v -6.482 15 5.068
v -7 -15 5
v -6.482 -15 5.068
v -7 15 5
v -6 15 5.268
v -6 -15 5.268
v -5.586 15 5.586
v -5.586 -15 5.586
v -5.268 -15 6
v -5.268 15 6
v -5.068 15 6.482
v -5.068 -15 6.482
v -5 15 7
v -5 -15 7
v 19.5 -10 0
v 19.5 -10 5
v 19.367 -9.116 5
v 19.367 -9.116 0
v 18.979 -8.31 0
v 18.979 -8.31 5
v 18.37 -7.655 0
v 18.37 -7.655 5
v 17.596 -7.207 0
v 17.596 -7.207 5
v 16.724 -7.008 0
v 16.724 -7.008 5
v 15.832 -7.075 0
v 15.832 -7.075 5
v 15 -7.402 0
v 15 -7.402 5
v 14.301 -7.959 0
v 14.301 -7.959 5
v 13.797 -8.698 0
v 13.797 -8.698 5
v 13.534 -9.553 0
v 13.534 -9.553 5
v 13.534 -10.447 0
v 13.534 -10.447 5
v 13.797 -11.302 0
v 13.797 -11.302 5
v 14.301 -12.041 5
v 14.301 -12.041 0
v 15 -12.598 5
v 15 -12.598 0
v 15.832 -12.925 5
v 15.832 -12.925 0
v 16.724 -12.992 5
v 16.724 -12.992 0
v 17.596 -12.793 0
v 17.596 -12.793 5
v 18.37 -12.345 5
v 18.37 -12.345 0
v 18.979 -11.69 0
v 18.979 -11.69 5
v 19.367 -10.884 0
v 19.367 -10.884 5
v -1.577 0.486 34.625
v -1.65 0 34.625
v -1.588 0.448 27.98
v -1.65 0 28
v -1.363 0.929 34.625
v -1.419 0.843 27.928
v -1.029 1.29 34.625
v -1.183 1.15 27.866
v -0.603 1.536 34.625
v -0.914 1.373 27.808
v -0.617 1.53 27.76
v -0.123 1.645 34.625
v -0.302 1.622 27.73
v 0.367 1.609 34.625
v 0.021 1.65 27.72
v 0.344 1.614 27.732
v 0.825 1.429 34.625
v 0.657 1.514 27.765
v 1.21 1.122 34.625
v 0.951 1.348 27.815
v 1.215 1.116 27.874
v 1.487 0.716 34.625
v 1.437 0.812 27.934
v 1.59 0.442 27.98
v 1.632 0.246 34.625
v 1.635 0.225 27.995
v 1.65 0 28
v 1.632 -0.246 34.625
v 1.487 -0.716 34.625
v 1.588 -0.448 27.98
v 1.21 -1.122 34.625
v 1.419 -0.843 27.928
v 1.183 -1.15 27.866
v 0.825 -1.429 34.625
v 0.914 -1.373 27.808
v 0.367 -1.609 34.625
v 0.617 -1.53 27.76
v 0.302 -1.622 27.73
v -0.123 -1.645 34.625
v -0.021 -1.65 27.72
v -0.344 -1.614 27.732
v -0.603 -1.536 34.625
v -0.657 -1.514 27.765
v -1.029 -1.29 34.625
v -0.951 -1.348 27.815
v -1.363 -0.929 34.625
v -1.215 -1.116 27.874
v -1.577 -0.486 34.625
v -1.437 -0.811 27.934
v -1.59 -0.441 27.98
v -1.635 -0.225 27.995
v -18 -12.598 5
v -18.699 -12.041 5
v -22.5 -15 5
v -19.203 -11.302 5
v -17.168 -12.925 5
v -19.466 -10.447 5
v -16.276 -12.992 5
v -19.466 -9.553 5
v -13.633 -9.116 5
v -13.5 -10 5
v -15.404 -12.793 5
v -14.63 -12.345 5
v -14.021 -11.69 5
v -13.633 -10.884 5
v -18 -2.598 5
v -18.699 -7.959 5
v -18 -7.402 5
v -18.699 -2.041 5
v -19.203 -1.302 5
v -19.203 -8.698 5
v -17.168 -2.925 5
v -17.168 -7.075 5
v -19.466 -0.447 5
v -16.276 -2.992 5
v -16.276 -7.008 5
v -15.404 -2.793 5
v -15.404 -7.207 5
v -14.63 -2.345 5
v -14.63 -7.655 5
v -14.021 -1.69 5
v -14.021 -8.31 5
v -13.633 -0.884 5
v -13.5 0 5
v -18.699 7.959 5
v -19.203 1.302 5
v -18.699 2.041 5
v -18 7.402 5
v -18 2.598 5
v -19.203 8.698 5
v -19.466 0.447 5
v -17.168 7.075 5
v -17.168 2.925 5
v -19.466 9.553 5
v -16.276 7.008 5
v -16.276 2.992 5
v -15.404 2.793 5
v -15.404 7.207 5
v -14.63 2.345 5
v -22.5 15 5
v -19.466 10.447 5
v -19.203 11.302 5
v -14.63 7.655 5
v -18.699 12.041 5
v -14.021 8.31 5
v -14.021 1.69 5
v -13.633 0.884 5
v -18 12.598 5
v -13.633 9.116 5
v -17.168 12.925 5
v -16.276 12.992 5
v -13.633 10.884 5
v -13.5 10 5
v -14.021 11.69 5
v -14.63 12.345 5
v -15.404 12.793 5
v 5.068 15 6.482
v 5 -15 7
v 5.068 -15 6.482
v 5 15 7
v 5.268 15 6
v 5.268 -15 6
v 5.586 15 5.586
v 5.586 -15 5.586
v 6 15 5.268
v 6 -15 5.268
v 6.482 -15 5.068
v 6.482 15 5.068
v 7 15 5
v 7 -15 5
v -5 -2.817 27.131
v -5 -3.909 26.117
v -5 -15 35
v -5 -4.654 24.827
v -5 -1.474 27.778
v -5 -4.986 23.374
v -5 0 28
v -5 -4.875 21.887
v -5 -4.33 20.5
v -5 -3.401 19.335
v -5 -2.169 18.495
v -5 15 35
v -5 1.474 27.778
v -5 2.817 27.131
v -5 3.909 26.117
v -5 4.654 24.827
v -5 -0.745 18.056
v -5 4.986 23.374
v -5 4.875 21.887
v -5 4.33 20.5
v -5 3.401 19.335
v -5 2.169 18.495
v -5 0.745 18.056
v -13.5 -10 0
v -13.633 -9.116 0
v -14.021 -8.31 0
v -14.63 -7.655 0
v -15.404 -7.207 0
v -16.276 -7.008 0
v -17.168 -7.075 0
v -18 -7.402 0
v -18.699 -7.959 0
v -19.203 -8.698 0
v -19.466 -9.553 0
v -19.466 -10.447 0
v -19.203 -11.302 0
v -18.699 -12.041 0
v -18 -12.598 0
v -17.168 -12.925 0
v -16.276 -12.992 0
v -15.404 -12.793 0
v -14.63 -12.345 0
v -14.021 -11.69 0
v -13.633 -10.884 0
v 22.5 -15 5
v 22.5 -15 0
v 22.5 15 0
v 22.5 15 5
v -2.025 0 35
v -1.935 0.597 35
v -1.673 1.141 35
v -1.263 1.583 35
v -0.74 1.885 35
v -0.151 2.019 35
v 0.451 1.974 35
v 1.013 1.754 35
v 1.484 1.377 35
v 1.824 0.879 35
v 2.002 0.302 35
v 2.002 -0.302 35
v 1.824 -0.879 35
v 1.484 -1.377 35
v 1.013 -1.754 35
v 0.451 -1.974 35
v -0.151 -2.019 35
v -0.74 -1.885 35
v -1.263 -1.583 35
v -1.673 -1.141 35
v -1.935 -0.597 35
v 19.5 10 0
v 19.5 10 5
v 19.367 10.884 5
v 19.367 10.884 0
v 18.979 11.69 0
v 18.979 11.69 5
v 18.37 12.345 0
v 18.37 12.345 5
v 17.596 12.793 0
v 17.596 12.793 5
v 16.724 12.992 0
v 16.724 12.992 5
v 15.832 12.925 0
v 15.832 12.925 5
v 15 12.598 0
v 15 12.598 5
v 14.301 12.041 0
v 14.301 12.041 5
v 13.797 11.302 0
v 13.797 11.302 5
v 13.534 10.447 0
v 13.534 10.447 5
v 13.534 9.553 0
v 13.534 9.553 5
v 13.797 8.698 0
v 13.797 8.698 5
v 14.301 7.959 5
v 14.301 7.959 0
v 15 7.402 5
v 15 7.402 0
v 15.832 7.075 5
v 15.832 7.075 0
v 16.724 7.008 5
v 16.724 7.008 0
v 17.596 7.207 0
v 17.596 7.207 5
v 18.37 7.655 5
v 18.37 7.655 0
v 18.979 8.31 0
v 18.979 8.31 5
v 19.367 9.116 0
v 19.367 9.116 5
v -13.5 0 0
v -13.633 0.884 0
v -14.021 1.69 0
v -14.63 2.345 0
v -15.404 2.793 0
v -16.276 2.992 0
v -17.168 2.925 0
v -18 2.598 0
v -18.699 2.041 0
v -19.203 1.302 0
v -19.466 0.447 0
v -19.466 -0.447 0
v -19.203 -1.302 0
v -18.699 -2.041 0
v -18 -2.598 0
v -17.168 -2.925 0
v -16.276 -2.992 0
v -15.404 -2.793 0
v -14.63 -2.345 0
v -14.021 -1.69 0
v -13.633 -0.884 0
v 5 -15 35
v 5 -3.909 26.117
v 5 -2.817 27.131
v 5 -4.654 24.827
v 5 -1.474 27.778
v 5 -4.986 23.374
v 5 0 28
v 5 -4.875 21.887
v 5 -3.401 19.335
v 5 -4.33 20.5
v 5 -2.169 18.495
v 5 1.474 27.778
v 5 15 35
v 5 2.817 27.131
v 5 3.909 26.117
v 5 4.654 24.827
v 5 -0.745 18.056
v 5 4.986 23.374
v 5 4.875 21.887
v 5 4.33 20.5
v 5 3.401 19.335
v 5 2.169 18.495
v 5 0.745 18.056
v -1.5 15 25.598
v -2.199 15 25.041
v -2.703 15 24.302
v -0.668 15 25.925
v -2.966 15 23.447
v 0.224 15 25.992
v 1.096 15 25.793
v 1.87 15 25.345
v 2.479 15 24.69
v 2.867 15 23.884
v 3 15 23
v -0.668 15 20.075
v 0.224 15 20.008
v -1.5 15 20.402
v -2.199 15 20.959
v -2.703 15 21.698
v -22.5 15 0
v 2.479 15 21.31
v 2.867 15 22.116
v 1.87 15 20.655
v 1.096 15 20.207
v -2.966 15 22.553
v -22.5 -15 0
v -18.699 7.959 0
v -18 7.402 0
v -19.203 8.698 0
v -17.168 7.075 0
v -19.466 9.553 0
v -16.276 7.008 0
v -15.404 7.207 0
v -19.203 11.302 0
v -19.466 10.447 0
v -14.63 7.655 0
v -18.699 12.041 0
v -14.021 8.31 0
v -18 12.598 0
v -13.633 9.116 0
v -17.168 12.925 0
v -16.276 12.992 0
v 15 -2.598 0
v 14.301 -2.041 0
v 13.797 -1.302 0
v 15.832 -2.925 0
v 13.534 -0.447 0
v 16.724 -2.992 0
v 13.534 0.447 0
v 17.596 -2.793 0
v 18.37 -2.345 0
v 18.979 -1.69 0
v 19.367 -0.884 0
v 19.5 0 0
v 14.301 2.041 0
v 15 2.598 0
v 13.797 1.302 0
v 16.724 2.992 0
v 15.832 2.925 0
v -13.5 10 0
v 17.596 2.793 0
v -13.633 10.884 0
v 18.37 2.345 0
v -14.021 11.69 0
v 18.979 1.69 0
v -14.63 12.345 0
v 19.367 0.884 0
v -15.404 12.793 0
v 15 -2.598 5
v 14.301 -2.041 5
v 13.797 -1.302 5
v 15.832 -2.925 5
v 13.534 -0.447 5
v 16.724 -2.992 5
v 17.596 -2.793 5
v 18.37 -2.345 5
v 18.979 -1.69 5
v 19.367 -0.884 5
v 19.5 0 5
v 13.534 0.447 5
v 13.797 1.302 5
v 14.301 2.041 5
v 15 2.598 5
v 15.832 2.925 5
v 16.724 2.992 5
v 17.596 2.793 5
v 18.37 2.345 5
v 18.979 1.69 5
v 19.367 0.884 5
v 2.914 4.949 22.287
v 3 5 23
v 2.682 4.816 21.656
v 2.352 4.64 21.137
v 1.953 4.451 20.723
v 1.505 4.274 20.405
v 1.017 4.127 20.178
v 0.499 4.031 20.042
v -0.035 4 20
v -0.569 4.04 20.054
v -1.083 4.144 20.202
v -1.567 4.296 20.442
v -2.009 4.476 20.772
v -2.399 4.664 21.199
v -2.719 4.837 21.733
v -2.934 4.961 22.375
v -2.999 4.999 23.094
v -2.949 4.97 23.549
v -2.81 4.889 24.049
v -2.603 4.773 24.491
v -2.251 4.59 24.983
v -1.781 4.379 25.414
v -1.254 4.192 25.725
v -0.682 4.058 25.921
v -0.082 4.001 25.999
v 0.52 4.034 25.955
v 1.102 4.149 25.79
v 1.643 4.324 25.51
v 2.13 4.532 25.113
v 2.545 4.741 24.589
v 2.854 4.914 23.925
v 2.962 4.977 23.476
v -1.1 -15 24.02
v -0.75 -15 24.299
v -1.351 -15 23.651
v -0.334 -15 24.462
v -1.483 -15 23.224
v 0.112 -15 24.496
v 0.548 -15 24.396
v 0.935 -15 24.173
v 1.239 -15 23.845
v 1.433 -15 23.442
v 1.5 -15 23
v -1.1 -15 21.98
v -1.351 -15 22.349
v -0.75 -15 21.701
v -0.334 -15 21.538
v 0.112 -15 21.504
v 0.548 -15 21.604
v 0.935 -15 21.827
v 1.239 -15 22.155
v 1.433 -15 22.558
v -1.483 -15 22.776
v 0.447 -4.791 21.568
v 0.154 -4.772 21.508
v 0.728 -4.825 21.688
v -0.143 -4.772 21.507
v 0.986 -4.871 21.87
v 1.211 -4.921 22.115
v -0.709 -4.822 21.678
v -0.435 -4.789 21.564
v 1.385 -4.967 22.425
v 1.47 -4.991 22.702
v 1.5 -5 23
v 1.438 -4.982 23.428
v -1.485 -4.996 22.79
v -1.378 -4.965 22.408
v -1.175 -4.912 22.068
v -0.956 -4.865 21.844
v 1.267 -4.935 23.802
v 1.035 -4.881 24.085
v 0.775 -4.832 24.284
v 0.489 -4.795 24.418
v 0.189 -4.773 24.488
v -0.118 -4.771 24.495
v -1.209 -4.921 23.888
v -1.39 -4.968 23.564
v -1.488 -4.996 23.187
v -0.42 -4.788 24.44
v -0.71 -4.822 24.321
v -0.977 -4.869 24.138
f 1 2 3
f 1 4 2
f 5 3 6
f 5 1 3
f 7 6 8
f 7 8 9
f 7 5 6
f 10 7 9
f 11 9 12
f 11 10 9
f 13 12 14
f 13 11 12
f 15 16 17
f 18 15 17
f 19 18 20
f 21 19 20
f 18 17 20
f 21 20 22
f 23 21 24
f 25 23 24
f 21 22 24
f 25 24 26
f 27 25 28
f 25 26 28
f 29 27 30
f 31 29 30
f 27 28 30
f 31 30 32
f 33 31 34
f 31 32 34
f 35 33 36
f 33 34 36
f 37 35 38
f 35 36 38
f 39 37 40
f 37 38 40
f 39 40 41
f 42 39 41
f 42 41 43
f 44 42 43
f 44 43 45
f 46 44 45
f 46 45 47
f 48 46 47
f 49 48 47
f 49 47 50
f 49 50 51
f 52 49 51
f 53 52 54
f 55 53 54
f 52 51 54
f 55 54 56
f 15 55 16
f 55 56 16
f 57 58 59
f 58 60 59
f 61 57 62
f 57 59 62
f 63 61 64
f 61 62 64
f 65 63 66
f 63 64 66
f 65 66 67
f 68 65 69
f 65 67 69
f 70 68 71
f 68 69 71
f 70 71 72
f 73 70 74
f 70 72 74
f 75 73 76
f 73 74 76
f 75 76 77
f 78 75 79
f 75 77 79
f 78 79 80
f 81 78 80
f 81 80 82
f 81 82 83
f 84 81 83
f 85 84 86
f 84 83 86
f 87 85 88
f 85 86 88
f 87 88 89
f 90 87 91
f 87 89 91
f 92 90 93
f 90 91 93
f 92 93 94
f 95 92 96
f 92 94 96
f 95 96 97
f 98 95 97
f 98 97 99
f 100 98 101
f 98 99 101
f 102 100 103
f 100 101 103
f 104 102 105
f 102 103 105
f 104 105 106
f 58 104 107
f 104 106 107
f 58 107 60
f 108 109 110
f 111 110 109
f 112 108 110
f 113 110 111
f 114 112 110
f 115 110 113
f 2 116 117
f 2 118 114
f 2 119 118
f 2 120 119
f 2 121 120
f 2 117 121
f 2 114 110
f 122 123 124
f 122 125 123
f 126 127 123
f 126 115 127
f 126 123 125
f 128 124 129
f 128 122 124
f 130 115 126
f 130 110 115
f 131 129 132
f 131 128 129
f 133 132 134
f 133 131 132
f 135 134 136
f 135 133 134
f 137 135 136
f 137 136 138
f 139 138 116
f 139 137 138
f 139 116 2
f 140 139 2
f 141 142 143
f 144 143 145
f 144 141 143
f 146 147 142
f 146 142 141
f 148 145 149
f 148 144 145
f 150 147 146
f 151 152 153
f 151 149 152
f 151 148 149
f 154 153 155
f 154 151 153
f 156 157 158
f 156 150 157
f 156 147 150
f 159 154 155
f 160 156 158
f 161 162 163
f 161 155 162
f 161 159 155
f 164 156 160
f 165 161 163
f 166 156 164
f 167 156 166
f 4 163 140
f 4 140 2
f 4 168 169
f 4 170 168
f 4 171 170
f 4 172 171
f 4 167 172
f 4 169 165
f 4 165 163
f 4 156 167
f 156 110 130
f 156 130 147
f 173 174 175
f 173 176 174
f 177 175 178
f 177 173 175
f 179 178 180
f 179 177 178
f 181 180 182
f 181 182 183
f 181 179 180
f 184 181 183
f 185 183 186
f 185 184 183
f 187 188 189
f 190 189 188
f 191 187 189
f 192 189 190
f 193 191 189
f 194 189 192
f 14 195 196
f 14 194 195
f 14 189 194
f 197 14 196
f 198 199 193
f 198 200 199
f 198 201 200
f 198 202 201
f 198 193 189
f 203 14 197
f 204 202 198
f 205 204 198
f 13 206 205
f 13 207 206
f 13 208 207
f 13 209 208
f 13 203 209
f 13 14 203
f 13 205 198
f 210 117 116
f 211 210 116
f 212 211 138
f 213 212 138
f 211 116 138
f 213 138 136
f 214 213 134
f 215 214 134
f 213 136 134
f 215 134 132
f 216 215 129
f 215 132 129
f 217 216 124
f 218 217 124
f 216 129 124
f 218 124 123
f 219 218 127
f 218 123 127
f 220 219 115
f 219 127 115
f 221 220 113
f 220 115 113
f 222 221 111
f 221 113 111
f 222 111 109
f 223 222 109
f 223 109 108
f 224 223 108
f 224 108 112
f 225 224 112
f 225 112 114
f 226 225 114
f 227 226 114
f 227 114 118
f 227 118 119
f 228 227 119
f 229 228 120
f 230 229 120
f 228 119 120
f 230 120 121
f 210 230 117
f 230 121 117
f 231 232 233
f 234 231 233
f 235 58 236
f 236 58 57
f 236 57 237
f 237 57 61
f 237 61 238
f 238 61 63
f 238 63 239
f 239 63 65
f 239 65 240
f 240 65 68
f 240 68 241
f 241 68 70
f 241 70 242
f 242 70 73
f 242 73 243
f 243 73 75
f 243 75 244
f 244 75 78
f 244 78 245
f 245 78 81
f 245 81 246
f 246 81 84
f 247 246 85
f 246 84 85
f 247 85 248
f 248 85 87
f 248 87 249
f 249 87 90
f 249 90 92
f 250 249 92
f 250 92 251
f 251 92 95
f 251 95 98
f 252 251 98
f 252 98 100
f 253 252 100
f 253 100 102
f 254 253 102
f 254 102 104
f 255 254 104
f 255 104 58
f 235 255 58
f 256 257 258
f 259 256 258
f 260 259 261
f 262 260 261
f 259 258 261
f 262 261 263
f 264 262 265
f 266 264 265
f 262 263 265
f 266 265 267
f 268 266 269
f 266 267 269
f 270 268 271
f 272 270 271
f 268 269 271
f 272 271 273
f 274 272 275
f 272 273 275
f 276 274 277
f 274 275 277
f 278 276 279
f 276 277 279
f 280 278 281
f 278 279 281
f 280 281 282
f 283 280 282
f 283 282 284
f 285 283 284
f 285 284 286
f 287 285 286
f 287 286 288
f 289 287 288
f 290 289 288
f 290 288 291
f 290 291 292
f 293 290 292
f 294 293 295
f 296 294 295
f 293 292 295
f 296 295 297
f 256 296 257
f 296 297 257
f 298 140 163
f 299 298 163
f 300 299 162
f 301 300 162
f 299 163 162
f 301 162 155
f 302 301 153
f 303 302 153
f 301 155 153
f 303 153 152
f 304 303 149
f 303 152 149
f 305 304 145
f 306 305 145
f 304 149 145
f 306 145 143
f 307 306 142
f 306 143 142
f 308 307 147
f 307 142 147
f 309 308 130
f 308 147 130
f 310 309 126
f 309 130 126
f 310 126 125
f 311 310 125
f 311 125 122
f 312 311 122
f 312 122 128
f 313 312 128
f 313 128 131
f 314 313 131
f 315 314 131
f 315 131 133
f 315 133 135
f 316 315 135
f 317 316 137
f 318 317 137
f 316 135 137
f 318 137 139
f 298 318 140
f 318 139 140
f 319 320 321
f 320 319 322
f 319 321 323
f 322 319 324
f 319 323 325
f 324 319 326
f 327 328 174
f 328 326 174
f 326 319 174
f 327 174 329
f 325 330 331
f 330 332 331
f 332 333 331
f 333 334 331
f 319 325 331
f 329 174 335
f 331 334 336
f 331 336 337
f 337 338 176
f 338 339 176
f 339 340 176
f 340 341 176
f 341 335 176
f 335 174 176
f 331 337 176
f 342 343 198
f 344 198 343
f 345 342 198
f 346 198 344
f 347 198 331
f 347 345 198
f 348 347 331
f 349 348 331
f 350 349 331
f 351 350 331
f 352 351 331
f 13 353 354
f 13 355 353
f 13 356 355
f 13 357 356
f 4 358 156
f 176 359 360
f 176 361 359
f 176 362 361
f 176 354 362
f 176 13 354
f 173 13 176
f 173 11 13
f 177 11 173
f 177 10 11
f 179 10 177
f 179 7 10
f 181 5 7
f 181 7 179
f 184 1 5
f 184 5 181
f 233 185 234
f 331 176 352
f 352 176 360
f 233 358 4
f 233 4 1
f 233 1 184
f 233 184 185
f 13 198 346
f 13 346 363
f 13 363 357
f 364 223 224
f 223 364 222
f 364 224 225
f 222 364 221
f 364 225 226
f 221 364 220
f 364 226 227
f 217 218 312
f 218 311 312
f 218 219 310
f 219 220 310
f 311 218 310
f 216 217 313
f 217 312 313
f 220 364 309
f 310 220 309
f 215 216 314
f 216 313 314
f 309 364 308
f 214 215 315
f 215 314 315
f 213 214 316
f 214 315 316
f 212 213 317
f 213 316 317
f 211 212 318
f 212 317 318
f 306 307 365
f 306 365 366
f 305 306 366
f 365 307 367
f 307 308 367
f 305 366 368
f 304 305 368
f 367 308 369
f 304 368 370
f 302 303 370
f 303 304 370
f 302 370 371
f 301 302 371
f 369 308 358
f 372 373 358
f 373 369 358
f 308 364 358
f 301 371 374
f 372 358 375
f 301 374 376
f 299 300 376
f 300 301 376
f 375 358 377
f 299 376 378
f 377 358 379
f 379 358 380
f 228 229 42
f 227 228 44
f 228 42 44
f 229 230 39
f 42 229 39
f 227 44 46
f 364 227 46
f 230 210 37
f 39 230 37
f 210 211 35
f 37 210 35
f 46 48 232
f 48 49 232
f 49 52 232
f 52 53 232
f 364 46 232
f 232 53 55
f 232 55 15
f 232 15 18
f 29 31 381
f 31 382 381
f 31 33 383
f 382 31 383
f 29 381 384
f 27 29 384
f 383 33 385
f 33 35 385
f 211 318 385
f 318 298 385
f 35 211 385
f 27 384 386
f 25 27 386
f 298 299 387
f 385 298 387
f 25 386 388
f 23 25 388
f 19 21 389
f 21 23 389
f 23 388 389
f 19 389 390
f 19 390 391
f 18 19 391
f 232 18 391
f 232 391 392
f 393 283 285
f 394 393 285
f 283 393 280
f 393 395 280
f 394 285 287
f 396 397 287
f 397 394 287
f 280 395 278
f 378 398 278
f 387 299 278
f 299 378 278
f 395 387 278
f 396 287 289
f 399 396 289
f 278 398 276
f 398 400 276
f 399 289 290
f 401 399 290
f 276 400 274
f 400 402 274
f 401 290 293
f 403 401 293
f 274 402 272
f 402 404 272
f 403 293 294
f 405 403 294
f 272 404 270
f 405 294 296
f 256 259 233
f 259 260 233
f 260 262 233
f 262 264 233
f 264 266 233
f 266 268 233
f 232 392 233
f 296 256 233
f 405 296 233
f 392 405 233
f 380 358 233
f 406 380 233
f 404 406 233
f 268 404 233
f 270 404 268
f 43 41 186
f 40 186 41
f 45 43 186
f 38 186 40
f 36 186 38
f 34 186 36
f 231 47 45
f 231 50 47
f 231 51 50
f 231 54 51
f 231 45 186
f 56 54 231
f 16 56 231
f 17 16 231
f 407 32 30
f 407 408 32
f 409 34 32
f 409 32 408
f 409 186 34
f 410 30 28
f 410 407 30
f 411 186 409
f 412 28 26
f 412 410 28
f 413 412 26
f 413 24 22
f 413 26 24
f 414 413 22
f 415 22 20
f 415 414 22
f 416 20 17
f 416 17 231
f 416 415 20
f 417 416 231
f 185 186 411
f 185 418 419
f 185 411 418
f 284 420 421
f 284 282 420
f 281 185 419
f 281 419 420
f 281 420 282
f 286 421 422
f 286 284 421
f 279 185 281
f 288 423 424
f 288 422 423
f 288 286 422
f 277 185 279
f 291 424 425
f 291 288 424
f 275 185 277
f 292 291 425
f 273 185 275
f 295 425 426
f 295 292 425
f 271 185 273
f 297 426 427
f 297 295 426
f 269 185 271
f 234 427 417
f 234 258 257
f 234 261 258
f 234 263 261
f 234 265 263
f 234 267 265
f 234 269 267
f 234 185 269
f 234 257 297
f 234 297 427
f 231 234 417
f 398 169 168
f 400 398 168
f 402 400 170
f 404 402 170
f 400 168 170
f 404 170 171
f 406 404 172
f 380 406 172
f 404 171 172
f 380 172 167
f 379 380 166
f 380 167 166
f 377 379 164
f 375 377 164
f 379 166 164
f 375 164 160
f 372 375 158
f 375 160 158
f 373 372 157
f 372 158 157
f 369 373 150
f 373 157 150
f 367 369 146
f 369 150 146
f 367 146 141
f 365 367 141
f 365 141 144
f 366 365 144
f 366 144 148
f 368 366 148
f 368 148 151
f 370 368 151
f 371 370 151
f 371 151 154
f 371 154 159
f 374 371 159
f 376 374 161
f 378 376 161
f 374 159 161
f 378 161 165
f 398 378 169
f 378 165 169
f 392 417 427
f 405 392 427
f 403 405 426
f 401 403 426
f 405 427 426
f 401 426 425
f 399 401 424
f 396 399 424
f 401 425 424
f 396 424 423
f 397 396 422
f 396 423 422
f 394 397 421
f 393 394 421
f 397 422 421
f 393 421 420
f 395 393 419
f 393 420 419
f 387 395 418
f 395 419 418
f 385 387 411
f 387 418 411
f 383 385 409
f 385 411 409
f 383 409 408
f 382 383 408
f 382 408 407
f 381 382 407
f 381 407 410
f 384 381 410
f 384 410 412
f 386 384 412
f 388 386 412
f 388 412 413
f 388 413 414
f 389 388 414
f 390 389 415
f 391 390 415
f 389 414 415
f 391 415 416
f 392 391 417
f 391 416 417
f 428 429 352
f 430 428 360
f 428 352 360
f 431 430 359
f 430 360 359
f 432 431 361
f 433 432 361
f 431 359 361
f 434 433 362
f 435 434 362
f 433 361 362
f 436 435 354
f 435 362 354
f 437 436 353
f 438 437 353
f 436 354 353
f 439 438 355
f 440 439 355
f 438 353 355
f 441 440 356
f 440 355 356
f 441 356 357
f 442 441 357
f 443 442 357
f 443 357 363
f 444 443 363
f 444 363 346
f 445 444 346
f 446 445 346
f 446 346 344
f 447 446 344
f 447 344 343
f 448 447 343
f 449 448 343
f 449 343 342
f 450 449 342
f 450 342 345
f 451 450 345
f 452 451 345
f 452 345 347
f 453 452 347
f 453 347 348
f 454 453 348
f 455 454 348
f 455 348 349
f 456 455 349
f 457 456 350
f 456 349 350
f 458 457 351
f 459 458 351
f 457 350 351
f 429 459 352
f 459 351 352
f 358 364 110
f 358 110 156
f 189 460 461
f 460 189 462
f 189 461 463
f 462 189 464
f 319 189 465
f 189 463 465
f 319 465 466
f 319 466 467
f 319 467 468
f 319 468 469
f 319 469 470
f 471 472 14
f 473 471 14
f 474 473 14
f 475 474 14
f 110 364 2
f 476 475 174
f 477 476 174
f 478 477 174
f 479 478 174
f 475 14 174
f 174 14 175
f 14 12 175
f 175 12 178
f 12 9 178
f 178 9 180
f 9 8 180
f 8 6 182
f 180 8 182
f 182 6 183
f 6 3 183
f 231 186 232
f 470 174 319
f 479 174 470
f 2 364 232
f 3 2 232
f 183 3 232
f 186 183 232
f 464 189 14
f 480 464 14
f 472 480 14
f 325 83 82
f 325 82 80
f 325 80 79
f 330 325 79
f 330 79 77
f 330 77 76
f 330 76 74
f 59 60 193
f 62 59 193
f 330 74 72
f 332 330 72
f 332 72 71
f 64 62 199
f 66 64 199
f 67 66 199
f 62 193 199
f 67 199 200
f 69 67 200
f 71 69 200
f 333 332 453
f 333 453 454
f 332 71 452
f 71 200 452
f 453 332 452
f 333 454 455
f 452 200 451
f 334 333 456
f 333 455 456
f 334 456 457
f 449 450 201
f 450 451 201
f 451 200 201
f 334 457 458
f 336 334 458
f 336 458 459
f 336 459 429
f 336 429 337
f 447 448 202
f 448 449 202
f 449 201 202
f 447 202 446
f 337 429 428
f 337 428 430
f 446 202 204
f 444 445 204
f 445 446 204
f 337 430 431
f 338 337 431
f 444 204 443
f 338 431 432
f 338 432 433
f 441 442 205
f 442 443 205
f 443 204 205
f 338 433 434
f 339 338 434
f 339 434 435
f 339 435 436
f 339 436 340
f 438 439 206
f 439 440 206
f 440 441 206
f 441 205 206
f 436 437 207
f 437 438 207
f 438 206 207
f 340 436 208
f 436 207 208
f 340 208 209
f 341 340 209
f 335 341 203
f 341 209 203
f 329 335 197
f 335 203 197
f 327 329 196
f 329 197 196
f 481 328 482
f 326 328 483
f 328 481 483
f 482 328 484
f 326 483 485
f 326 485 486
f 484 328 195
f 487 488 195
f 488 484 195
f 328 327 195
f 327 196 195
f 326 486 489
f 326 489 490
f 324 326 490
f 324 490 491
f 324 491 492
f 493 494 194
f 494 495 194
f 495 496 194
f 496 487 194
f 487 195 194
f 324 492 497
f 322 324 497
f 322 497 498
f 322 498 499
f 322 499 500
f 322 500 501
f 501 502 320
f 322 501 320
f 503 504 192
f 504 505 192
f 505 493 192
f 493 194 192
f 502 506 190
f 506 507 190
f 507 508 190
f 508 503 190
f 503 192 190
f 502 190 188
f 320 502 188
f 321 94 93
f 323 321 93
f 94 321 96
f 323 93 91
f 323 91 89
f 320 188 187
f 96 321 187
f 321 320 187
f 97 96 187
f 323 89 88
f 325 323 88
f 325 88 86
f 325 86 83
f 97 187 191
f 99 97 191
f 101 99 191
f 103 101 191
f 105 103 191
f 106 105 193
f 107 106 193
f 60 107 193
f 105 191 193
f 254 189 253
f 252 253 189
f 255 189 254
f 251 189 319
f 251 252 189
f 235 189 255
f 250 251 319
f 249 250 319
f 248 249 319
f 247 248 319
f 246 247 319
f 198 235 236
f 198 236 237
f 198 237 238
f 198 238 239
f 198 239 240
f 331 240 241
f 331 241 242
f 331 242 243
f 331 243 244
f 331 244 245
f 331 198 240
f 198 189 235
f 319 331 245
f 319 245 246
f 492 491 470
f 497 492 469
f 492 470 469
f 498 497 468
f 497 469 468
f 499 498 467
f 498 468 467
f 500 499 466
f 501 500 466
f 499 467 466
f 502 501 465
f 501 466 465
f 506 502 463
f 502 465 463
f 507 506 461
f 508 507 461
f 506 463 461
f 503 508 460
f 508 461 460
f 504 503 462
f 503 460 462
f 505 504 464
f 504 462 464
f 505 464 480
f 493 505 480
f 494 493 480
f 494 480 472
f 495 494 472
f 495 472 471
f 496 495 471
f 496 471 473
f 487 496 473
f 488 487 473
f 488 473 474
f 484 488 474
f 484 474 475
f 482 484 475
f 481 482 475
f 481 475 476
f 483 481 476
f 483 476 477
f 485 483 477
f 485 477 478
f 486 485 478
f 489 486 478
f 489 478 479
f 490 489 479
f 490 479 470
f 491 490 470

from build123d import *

# Parameters (mm, degrees)
SKETCH1_W                   = 45
SKETCH1_H                   = 30
BASE_DEPTH                  = 5
SKETCH2_W                   = 10
SKETCH2_H                   = 30
BOSS_EXTRUDE2_DEPTH         = 30
SKETCH3_R                   = 5
CUT_EXTRUDE3_DEPTH          = 10
SKETCH9_R                   = 3
SCREW_DEPTH                 = 5
SKETCH10_R                  = 3
TOP_HOLE_DEPTH              = 15
SKETCH11_R                  = 1.5
BOTTOM_HOLE_DEPTH           = 15
FILLET1_R                   = 2
FILLET2_R                   = 2
M4_TAPPED_HOLE3_D           = 3.3
M4_TAPPED_HOLE3_DEPTH       = 10.1
M4_TAPPED_HOLE3_CSINK_D     = 4.05
M4_TAPPED_HOLE3_CSINK_ANGLE = 90
M4_TAPPED_HOLE3_TIP         = 0.991420021


with BuildPart() as part:
    # Sketch1 → Base (new body)
    with BuildSketch(Plane.XY):
        Rectangle(SKETCH1_W, SKETCH1_H)
    extrude(amount=BASE_DEPTH)

    # Sketch2 → Boss-Extrude2 (add)
    with BuildSketch(Plane.XY.offset(5)):
        Rectangle(SKETCH2_W, SKETCH2_H)
    extrude(amount=BOSS_EXTRUDE2_DEPTH)

    # Sketch3 → Cut-Extrude3 (cut)
    with BuildSketch(Plane.ZY.offset(5)):
        with Locations((23, 0)):
            Circle(SKETCH3_R)
    extrude(amount=-CUT_EXTRUDE3_DEPTH, mode=Mode.SUBTRACT)

    # Sketch9 → Screw (cut)
    with BuildSketch(Plane.XY.offset(5)):
        with Locations((-16.5, 10)):
            Circle(SKETCH9_R)
        with Locations((-16.5, 0)):
            Circle(SKETCH9_R)
        with Locations((-16.5, -10)):
            Circle(SKETCH9_R)
        with Locations((16.5, -10)):
            Circle(SKETCH9_R)
        with Locations((16.5, 0)):
            Circle(SKETCH9_R)
        with Locations((16.5, 10)):
            Circle(SKETCH9_R)
    extrude(amount=-SCREW_DEPTH, mode=Mode.SUBTRACT)

    # Sketch10 → Top hole (cut)
    with BuildSketch(Plane(origin=(0, 15, 0), x_dir=(1, 0, 0), z_dir=(0, 1, 0))):
        with Locations((0, -23)):
            Circle(SKETCH10_R)
    extrude(amount=-TOP_HOLE_DEPTH, mode=Mode.SUBTRACT)

    # Sketch11 → Bottom hole (cut)
    with BuildSketch(Plane.XZ.offset(15)):
        with Locations((0, 23)):
            Circle(SKETCH11_R)
    extrude(amount=-BOTTOM_HOLE_DEPTH, mode=Mode.SUBTRACT)

    # Fillet1
    fillet1_edges = [part.edges().sort_by_distance(p)[0] for p in [
        (-5, 0, 5),
    ]]
    fillet(fillet1_edges, radius=FILLET1_R)

    # Fillet2
    fillet2_edges = [part.edges().sort_by_distance(p)[0] for p in [
        (5, 0, 5),
    ]]
    fillet(fillet2_edges, radius=FILLET2_R)

    # M4 Tapped Hole3
    with Locations(Plane.XY.offset(35)):
        with Locations((0, 0)):
            CounterSinkHole(M4_TAPPED_HOLE3_D / 2, M4_TAPPED_HOLE3_CSINK_D / 2, depth=M4_TAPPED_HOLE3_DEPTH, counter_sink_angle=M4_TAPPED_HOLE3_CSINK_ANGLE)
            with Locations((0, 0, -(M4_TAPPED_HOLE3_DEPTH + M4_TAPPED_HOLE3_TIP / 2))):  # 118° drill point
                Cone(0, M4_TAPPED_HOLE3_D / 2, M4_TAPPED_HOLE3_TIP, mode=Mode.SUBTRACT)


solid = part.part
